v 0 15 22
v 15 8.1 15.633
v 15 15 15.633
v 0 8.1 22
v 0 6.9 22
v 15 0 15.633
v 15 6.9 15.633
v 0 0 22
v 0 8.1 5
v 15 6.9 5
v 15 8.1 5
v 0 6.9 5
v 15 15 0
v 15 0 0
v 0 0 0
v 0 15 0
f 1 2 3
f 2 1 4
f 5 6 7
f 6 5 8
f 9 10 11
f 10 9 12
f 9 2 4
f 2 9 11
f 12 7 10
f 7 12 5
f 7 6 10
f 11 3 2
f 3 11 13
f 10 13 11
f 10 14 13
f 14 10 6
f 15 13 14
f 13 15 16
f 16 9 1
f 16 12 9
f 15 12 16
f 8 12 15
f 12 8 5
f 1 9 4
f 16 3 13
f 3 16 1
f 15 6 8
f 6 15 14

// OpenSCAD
difference(){
	union(){ 

        translate([0,0,0]){
           cube([15,15,17+5], center=false);
        }
        

	}
	union() {
        translate([0,-1,17+5]){
           rotate([0,23,0]){
            cube([30,30,30], center=false);
           }
        }
        translate([-1,(15-1.2)/2,5]){
            cube([30,1.2,60], center=false);
        }

	}
}
